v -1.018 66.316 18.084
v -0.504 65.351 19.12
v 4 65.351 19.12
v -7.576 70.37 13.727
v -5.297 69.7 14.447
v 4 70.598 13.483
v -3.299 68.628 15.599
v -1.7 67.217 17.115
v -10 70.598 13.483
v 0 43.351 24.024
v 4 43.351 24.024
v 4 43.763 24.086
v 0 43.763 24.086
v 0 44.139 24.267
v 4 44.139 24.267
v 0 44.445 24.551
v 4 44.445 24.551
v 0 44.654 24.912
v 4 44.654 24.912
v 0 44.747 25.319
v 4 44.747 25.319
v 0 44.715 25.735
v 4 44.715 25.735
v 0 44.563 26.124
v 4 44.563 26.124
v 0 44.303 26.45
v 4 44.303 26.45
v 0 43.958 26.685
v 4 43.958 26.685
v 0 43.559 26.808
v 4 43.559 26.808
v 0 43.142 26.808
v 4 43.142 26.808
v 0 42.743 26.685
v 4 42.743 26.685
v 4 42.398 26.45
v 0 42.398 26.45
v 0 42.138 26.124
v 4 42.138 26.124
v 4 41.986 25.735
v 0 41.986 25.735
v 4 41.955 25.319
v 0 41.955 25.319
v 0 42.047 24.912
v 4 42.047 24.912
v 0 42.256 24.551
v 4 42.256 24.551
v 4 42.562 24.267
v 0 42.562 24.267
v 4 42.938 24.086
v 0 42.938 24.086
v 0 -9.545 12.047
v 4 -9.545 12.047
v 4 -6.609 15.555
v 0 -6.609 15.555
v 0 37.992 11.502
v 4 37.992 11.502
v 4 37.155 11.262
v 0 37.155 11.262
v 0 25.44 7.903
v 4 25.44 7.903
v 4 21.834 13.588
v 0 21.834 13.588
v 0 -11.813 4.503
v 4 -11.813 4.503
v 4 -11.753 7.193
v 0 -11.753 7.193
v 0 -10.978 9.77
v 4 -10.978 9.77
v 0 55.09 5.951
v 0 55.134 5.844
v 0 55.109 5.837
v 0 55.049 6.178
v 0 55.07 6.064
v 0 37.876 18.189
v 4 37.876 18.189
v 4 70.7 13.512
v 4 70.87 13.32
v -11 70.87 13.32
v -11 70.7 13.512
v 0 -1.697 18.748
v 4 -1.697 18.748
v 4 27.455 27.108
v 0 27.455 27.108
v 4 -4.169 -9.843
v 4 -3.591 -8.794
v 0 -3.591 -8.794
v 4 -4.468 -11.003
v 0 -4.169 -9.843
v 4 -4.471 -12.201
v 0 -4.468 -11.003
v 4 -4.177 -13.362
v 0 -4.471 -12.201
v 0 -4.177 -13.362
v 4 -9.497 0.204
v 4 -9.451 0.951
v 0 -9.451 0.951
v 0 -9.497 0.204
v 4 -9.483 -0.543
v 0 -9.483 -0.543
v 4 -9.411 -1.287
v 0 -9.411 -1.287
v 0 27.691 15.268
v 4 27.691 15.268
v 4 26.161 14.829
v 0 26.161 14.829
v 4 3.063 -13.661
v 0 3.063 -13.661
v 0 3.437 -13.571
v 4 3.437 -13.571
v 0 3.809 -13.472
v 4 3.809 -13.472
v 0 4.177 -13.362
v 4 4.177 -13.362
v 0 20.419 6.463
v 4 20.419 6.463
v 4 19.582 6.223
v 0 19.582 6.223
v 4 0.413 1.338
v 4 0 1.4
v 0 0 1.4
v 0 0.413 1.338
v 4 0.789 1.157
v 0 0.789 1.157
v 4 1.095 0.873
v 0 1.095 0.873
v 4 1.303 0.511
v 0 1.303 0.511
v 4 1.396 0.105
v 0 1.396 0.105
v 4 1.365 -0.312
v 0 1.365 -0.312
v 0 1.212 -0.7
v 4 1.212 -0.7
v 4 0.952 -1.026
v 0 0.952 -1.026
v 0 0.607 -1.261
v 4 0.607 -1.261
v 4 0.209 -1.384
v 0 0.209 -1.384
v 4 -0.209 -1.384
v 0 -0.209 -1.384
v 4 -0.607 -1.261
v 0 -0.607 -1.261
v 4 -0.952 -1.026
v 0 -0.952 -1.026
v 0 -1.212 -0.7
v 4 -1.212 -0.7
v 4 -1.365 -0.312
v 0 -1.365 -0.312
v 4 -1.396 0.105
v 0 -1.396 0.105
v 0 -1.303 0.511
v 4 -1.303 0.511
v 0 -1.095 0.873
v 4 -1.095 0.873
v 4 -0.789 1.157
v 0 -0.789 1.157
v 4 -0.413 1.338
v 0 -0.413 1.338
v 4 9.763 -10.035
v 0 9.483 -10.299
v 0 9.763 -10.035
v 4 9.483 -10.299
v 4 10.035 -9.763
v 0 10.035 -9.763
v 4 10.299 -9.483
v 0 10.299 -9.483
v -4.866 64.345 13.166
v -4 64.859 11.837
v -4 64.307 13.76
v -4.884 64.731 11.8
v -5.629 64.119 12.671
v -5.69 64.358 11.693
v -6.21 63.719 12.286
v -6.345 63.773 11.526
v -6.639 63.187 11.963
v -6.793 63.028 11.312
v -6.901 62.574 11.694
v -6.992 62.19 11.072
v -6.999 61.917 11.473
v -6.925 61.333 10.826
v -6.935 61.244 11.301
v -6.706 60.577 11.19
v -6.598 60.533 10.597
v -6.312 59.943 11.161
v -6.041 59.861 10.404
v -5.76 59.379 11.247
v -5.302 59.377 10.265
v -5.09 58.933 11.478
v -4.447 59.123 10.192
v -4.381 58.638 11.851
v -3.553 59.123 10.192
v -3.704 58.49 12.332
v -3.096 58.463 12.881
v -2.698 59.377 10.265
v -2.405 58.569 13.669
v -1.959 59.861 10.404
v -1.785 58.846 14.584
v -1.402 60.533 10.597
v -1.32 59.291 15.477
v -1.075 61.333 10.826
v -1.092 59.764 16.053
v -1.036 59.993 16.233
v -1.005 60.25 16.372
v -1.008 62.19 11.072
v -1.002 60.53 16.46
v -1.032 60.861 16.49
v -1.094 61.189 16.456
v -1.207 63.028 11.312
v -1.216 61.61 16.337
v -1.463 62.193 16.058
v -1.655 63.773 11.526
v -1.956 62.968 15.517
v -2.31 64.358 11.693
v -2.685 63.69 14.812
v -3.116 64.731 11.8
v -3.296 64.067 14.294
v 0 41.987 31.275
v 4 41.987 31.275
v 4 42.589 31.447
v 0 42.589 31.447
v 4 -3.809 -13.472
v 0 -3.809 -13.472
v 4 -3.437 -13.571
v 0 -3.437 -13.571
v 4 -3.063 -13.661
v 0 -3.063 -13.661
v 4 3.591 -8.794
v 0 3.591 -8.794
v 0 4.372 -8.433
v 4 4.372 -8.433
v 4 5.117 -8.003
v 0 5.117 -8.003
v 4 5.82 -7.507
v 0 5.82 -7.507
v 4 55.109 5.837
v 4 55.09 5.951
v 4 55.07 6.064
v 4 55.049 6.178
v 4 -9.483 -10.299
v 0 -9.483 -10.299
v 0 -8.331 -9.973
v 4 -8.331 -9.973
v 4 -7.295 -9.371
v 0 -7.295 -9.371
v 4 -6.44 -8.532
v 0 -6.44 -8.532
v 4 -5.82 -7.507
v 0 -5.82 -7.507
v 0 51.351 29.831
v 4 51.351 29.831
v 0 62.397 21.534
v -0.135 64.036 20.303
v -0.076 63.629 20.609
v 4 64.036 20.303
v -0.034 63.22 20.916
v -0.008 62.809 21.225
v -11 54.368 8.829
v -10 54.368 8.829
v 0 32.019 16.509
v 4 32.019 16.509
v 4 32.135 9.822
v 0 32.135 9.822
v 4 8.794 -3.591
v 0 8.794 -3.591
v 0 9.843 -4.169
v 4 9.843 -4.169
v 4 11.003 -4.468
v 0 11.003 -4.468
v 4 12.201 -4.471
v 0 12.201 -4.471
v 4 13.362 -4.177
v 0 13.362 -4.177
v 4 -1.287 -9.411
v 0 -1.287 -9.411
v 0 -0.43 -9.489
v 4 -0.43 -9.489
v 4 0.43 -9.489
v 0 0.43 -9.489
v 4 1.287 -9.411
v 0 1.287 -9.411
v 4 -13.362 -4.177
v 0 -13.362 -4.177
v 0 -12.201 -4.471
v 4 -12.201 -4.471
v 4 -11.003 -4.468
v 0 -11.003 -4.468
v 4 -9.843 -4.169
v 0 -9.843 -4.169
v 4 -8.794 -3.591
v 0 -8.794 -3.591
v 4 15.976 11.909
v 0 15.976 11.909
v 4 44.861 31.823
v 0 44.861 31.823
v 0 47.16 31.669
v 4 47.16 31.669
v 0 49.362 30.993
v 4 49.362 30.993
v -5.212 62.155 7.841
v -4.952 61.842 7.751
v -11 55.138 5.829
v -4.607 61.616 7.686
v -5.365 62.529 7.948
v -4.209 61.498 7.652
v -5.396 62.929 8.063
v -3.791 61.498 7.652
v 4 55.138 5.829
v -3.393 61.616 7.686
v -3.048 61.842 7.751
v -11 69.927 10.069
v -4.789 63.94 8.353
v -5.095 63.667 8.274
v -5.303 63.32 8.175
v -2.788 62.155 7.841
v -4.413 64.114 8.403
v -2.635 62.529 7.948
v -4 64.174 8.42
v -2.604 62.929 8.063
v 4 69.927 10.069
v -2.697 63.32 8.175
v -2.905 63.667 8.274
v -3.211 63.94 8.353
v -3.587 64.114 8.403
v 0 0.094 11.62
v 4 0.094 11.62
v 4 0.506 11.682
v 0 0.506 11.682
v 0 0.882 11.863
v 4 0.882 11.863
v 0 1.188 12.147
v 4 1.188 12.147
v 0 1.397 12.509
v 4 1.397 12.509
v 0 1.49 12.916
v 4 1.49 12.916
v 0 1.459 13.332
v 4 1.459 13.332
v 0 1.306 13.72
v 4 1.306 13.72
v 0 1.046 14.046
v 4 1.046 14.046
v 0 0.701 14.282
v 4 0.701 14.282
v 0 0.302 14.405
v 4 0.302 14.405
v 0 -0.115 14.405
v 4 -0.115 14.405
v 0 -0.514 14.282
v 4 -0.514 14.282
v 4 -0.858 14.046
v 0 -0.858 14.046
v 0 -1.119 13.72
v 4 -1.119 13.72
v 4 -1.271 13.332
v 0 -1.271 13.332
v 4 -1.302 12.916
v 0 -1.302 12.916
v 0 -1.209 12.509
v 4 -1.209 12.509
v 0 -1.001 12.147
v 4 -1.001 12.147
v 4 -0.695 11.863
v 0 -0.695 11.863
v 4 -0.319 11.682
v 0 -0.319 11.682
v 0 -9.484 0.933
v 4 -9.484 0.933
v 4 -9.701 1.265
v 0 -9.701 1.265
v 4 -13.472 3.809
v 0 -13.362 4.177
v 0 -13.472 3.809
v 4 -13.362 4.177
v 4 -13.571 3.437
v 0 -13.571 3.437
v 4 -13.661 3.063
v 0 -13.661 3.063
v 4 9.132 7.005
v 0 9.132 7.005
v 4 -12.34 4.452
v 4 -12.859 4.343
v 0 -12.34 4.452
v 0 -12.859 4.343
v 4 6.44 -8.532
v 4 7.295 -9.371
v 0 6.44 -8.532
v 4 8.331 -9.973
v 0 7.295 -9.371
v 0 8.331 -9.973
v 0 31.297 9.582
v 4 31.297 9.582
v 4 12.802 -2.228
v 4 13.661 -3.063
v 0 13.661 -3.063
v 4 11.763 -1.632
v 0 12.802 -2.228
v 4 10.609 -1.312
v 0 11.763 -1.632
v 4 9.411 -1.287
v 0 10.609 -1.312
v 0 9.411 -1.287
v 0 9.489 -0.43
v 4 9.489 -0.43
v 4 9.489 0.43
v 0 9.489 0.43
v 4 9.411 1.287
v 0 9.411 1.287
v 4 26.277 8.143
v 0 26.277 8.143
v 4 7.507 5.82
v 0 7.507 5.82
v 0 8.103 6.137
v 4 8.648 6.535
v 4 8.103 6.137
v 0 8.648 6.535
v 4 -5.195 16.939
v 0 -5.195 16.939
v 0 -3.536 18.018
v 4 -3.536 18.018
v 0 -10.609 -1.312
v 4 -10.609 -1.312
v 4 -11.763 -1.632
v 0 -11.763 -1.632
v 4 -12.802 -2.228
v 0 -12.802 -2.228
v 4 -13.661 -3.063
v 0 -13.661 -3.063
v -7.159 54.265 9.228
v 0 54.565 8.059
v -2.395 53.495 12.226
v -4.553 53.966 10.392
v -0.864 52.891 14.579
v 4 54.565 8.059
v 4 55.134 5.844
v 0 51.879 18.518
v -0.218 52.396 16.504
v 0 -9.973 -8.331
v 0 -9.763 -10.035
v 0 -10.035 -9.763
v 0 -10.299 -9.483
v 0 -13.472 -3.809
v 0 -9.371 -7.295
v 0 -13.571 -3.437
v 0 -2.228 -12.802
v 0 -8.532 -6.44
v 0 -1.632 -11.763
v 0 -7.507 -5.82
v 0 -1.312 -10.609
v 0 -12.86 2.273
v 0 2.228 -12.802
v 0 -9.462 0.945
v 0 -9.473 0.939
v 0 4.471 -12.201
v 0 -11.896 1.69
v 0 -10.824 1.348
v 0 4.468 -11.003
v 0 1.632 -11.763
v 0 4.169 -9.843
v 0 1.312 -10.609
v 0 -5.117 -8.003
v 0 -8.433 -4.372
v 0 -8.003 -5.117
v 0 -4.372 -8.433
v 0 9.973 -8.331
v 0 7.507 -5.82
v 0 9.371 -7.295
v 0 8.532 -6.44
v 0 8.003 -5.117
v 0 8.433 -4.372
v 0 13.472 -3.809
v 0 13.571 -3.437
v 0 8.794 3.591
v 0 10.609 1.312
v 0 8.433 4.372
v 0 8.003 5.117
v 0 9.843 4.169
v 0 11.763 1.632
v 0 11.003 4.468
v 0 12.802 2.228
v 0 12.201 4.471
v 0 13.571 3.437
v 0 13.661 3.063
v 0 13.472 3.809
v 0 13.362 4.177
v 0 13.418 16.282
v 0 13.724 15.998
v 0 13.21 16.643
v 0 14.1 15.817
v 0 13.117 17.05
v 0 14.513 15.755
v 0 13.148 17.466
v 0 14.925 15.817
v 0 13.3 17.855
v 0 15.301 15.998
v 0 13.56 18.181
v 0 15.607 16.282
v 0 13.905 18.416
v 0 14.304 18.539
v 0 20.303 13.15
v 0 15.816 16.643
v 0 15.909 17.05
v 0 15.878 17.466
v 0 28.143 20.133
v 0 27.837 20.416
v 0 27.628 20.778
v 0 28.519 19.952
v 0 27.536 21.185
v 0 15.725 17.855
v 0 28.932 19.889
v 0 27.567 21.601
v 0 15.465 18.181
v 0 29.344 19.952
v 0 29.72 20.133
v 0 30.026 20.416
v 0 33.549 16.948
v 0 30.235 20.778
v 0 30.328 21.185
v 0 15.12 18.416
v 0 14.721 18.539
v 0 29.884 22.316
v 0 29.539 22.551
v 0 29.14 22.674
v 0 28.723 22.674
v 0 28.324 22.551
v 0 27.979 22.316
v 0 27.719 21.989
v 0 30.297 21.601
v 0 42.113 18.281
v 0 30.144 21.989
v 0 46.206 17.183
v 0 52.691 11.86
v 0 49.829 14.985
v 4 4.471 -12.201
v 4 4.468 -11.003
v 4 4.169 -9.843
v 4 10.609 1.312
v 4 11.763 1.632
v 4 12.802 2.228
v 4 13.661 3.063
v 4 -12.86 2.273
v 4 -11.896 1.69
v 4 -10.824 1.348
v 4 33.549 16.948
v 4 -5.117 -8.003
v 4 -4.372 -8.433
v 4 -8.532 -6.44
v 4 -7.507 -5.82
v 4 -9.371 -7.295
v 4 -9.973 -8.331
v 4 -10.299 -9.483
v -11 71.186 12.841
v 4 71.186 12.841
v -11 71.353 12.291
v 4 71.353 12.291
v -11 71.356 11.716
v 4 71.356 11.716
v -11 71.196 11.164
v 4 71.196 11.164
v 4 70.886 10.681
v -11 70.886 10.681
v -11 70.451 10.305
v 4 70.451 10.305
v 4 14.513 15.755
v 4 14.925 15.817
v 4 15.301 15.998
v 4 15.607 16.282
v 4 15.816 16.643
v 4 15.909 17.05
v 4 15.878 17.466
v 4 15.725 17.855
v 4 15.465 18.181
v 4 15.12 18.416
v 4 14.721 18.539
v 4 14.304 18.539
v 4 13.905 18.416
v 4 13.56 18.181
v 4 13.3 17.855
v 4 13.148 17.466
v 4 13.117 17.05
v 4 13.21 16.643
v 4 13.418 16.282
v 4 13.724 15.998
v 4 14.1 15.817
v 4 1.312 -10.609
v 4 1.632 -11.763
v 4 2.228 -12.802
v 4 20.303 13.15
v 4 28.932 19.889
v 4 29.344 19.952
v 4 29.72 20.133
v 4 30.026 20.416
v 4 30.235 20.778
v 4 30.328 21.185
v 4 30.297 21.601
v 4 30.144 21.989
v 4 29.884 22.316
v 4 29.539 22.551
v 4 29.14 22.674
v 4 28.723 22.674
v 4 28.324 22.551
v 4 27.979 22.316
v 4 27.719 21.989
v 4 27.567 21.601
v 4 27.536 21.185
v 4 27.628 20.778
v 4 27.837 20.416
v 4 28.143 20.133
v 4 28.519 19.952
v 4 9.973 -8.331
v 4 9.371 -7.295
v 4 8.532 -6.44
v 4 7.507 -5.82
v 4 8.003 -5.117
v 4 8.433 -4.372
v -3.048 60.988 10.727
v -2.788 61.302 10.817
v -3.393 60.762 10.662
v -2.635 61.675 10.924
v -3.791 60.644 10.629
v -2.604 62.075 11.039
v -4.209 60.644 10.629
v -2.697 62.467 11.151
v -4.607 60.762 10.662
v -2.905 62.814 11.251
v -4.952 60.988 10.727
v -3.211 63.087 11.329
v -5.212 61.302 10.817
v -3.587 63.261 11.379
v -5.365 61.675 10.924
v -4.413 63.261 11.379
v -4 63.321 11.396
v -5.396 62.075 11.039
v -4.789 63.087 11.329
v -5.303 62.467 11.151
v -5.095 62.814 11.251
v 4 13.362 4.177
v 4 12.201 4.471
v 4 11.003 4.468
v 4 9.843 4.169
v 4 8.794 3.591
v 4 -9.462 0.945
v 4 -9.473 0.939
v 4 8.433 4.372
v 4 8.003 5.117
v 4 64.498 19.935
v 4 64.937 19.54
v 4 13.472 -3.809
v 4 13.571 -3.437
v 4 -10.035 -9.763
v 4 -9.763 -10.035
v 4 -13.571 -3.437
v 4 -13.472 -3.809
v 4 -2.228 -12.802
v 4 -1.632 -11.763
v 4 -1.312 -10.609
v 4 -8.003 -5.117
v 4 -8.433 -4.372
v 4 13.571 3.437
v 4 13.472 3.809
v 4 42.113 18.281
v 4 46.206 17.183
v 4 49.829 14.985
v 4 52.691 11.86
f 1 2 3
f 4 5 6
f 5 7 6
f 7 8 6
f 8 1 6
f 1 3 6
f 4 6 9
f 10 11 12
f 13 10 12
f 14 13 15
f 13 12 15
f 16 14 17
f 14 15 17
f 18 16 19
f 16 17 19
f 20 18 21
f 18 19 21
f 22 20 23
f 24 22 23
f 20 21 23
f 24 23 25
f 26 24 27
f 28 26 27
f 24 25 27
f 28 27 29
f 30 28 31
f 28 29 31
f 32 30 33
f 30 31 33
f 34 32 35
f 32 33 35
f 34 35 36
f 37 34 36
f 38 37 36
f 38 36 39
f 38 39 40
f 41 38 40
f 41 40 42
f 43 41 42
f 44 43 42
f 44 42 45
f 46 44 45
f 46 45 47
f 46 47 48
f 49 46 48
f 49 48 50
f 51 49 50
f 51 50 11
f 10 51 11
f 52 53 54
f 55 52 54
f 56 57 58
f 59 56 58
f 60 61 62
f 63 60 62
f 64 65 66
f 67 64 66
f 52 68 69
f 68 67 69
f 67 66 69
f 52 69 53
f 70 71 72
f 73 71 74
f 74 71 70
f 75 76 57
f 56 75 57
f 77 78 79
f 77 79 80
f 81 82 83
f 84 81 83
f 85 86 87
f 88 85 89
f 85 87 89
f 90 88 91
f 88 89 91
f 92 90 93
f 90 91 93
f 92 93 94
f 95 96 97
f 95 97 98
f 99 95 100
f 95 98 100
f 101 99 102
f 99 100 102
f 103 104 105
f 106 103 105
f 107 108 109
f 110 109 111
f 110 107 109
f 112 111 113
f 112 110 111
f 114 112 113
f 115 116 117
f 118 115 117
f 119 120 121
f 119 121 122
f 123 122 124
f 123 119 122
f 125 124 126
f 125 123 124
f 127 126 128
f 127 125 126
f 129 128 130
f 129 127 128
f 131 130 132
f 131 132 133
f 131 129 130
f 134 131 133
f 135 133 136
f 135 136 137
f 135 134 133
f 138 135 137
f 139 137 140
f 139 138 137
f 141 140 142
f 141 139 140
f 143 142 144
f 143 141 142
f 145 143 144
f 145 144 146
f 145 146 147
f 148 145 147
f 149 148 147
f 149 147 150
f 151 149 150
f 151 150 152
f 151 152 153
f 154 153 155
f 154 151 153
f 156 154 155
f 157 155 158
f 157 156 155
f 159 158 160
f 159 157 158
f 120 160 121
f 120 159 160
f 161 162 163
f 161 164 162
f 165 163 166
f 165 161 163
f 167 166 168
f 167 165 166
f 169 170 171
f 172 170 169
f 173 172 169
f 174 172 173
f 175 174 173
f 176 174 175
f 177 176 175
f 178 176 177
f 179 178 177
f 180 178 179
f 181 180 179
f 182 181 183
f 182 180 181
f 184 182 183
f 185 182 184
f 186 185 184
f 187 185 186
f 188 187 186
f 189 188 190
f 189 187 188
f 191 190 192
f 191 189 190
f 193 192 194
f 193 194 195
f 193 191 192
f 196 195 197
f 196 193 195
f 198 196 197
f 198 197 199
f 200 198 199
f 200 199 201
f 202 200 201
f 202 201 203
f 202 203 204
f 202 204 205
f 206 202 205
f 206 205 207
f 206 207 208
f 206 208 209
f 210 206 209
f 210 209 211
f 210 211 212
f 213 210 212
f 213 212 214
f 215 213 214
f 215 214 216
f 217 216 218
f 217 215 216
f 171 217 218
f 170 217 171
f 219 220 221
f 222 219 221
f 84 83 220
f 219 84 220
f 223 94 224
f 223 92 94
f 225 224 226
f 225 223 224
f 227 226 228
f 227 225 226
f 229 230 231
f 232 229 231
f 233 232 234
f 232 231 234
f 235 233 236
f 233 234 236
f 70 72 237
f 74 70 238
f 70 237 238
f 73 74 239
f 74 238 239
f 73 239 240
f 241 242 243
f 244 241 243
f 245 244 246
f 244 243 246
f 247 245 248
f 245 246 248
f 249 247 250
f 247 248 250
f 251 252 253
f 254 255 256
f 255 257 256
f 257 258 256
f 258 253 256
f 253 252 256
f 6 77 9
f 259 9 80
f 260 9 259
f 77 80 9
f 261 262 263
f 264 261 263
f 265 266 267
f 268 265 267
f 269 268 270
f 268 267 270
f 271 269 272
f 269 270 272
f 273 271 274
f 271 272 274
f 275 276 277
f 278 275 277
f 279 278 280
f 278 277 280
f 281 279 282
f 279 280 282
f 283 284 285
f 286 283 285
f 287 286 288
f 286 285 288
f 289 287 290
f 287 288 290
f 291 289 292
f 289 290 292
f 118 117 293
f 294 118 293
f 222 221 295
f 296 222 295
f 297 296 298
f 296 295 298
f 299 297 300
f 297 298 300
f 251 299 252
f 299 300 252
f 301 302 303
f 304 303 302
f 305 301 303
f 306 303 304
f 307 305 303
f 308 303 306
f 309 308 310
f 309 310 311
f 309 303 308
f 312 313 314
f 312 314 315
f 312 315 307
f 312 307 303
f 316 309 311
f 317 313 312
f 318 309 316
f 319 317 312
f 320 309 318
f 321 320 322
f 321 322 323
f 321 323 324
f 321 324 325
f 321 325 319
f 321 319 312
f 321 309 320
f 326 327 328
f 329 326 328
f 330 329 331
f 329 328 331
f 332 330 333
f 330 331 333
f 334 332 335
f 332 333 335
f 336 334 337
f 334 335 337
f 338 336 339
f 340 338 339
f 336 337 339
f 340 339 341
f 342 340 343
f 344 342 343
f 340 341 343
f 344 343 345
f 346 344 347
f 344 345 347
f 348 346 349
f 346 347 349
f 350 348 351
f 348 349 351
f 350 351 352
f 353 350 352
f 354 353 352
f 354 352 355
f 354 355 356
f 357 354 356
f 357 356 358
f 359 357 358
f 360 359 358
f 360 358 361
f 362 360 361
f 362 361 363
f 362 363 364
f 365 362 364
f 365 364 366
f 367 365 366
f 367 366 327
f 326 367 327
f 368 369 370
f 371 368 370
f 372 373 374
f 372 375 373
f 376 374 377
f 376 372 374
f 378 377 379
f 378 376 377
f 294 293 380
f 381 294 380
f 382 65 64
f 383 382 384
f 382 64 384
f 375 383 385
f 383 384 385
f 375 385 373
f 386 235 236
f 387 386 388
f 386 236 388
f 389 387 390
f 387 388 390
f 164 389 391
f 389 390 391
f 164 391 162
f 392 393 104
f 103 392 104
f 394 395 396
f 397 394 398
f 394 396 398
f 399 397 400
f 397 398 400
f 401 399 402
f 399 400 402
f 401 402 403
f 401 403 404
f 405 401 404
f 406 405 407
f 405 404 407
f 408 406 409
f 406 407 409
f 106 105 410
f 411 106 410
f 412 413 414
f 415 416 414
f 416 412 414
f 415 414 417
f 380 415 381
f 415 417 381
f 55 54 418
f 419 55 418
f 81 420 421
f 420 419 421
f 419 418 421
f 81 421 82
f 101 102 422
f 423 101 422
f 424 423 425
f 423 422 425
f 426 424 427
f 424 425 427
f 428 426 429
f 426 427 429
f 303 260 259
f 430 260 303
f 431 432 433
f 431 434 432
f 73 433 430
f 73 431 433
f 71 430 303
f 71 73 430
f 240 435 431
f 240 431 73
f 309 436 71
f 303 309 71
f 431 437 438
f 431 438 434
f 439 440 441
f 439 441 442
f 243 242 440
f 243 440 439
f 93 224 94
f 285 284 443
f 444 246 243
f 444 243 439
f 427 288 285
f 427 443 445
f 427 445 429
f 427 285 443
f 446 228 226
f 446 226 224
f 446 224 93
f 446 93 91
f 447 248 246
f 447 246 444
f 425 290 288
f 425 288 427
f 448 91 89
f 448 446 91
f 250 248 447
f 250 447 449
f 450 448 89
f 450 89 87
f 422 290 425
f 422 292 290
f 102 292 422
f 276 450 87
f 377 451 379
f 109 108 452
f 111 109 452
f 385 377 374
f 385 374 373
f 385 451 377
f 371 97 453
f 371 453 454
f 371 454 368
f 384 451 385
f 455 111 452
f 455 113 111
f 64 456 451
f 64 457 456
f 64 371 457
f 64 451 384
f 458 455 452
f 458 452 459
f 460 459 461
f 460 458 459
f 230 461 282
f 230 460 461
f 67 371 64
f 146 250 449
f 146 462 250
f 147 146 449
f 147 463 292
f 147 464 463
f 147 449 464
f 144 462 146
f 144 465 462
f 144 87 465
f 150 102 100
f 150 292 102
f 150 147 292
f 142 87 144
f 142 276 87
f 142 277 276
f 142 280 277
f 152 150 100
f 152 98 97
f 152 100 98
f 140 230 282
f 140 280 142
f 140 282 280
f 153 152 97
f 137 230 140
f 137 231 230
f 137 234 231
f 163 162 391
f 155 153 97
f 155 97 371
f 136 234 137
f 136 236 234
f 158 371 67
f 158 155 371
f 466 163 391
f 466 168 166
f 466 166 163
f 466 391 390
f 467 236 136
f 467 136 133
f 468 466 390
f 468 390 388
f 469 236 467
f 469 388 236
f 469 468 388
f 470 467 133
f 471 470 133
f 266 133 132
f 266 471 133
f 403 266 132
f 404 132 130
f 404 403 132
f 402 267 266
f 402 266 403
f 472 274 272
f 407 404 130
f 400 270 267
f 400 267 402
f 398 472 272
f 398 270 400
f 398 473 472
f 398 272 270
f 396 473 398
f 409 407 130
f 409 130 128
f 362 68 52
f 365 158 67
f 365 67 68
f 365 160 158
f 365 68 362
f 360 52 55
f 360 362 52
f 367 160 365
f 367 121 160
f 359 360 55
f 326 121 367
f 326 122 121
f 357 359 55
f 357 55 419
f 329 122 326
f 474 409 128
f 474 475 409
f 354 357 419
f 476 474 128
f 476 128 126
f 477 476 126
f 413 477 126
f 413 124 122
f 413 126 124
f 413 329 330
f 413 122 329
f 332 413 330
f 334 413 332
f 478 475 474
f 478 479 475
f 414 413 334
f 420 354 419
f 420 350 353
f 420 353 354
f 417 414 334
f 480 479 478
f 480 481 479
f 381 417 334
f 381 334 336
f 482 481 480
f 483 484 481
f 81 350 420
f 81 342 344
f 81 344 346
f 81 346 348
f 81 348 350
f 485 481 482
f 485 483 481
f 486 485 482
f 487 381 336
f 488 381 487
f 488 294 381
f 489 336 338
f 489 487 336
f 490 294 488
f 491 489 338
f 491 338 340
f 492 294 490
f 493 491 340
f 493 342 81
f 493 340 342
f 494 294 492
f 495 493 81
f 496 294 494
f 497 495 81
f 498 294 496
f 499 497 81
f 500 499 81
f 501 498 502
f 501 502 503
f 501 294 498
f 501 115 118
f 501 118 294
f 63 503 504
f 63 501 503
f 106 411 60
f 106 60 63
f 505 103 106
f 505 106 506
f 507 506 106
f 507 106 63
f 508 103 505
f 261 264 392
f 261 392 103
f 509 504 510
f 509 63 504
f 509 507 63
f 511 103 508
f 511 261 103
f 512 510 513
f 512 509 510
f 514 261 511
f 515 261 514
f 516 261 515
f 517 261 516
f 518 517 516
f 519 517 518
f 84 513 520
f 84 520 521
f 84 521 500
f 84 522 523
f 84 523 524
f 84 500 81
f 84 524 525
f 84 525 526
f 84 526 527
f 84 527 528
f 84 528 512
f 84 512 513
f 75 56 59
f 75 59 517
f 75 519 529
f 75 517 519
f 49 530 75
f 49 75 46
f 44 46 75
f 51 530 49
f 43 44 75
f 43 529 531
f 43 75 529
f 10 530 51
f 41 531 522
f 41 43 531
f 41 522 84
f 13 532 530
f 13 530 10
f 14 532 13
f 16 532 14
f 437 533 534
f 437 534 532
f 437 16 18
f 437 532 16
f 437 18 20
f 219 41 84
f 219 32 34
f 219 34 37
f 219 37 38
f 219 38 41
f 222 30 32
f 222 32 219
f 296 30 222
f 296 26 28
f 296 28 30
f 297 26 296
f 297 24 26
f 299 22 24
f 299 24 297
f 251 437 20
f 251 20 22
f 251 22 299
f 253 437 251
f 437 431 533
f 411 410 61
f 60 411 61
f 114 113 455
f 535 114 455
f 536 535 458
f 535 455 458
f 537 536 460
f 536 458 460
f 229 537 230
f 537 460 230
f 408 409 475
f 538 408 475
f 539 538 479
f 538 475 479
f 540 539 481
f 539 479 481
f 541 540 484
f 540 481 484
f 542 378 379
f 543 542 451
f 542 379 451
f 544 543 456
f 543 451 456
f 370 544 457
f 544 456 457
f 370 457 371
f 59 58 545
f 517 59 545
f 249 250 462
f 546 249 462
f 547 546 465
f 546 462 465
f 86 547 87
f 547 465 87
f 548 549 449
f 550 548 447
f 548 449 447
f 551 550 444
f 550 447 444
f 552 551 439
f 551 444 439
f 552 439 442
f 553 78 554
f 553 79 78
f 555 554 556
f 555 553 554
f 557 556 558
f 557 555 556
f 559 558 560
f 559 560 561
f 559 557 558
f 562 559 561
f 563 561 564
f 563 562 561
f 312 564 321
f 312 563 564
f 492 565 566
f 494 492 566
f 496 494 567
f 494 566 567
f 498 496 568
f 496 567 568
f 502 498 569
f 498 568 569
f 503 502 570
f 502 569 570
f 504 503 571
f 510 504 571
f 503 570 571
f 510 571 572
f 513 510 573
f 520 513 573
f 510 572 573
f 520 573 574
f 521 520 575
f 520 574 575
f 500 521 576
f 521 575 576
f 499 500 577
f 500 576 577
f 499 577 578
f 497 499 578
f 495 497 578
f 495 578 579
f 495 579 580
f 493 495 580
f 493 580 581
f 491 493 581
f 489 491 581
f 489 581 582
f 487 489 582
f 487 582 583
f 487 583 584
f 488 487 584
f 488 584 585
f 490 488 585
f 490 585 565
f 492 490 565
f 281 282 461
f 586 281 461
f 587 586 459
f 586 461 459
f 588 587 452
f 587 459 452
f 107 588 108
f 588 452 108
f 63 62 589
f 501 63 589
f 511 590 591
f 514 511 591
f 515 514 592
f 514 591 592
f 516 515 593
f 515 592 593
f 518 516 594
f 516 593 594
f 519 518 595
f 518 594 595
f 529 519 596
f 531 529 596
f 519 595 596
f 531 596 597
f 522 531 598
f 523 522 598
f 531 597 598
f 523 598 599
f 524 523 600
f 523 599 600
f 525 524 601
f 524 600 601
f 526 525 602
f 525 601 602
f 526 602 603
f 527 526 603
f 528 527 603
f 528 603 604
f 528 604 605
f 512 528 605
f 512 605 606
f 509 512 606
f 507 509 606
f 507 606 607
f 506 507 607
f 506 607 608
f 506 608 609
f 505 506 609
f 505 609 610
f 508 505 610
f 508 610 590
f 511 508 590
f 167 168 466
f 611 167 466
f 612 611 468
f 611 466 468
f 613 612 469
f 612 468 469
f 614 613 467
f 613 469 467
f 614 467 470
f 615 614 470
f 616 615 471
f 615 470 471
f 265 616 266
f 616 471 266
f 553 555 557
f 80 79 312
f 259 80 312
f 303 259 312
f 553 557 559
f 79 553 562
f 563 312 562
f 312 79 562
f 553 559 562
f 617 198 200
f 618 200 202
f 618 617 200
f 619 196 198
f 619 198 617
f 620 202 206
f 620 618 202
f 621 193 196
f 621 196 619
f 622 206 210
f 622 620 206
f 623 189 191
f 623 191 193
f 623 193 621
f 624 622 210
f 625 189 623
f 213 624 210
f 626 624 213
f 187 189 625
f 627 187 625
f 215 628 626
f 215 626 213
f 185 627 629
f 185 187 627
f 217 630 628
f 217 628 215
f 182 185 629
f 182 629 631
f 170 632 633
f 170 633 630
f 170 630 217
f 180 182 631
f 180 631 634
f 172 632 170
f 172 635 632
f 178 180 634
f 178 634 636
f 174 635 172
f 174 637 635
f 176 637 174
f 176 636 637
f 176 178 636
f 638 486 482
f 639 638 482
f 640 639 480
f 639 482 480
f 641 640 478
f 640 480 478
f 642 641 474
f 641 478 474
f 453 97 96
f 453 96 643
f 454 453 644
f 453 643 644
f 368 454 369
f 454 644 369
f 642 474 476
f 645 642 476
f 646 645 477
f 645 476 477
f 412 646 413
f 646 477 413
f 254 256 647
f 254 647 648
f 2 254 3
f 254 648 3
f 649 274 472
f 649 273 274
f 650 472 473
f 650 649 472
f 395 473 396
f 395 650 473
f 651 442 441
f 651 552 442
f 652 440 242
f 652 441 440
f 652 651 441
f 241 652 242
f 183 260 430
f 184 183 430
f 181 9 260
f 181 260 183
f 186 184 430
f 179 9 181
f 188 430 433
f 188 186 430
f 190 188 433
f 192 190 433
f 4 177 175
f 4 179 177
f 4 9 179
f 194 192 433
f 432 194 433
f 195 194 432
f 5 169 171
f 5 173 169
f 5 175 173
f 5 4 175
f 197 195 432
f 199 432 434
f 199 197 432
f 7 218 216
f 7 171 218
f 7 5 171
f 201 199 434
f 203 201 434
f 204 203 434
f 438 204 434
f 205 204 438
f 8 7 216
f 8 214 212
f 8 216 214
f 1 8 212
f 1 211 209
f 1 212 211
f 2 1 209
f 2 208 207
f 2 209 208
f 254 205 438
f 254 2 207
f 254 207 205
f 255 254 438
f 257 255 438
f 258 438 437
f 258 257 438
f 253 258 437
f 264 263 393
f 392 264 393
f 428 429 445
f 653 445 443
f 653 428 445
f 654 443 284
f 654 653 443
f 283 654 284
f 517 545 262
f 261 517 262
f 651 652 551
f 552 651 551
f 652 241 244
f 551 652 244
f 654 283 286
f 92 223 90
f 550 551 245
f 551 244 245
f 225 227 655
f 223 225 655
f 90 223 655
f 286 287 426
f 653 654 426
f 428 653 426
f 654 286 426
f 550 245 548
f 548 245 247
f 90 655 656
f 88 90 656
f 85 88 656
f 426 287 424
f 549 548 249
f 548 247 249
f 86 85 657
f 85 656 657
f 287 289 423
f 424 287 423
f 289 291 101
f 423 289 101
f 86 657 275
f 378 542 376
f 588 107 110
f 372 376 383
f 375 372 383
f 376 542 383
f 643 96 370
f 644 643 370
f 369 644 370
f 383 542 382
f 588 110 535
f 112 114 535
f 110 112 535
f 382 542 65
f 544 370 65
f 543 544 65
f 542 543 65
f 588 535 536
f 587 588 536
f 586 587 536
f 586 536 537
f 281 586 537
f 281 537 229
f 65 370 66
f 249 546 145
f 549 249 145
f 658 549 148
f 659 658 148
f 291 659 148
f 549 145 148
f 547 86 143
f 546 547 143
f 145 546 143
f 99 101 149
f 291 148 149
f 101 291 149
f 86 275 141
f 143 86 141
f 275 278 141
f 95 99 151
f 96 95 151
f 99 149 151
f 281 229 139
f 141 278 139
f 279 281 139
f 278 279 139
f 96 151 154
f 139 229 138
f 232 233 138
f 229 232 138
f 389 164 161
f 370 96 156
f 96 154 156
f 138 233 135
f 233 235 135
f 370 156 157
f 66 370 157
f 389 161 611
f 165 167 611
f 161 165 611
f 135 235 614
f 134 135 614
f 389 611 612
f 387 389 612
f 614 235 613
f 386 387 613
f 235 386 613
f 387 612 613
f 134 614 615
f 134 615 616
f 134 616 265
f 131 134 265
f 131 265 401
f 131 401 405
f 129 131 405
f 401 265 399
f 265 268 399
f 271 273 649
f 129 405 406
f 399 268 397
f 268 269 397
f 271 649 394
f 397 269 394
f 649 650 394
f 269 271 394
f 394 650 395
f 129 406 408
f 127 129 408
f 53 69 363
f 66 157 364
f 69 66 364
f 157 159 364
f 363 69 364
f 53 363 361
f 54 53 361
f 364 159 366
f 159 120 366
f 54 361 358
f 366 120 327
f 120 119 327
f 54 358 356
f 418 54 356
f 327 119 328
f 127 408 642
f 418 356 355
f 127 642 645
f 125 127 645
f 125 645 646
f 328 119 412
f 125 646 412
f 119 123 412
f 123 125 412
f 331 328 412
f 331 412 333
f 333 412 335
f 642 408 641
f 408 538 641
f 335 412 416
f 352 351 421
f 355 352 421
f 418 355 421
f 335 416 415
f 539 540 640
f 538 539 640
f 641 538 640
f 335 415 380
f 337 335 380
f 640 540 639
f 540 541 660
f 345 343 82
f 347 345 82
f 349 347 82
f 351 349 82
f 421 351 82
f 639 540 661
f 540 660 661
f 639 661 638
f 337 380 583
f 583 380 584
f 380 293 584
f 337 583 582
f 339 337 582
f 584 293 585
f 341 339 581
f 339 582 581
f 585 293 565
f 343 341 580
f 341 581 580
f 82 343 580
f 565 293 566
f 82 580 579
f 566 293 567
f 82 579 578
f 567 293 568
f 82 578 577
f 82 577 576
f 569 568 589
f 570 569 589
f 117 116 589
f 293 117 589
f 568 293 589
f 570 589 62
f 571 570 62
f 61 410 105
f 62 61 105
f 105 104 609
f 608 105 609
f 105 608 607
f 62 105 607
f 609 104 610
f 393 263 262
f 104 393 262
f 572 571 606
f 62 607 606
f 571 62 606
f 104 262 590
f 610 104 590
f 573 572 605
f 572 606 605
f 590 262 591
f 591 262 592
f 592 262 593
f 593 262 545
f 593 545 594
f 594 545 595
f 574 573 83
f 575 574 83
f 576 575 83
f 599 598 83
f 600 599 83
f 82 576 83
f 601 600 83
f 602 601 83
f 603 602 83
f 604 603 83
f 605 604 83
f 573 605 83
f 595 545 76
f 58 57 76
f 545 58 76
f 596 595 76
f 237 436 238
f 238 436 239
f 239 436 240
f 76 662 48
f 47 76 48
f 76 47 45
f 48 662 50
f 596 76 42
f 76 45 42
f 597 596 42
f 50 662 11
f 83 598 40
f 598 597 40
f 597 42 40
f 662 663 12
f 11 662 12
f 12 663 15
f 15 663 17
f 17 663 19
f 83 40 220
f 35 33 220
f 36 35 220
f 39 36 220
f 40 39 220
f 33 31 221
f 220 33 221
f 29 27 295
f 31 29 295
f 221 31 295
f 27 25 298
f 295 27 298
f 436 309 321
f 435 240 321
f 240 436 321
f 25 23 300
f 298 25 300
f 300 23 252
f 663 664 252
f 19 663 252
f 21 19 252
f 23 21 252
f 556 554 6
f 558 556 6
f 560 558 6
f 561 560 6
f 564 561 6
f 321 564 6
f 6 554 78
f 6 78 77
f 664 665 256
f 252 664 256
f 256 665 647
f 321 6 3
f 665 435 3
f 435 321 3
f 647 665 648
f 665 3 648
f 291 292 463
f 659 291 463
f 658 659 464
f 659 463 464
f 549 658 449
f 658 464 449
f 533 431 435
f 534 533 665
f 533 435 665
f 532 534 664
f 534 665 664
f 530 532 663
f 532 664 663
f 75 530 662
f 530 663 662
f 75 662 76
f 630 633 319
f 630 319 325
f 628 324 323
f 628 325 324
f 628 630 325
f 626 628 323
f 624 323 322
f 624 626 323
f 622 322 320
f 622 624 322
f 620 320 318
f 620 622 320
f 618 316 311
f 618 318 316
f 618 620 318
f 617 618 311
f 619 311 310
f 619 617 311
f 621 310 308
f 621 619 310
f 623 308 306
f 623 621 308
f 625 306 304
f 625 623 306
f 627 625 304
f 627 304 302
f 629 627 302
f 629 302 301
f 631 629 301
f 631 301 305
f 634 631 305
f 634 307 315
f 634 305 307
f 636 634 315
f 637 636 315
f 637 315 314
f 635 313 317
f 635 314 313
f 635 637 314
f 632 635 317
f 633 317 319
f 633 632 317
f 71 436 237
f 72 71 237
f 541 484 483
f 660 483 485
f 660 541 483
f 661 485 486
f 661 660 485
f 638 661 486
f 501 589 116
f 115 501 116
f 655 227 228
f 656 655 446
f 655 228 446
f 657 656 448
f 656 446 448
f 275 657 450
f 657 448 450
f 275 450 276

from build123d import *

# Parameters (mm, degrees)
BASPROSKE_W              = 4
BASPROSKE_H              = 14
TOOTHCUT_DEPTH           = 21.199009877
TEETHCUTS_COUNT          = 12
TEETHCUTS_ANGLE          = 330
BORSKE_R                 = 4
BORE_DEPTH               = 50.0000508
EXTRUDE_1_DEPTH          = 4
FILLET_1_R               = 10
EXTRUDE_2_DEPTH          = 15
FILLET_2_R               = 2
FILLET_3_R               = 10
EXTRUDE_START            = -4
SKETCH_6_R               = 4
SKETCH_6_R_2             = 1.4
EXTRUDE_3_DEPTH          = 4
CUT_EXTRUDE_6_DEPTH      = 15
CUT_EXTRUDE_6_DEPTH_BACK = 34
SKETCH_7_R               = 1.4
SKETCH_8_R               = 3
CUT_EXTRUDE_7_DEPTH      = 6
SKETCH_10_R              = 1.4
CUT_EXTRUDE_8_DEPTH      = 15


with BuildPart() as part:
    # BasProSke → Base-Revolve (revolve)
    with BuildSketch(Plane(origin=(0, 0, 0), x_dir=(1, 0, 0), z_dir=(0, 1, 0)), mode=Mode.PRIVATE) as base_revolve_sk:
        with Locations((2, 7)):
            Rectangle(BASPROSKE_W, BASPROSKE_H)
    revolve(base_revolve_sk.sketch.rotate(Axis((-10, 0, 0), (1, 0, 0)), 180), axis=Axis((-10, 0, 0), (1, 0, 0)))

    # TooCutSke → ToothCut (cut, through all)
    with BuildSketch(Plane(origin=(0, 0, 0), x_dir=(0, 0, -1), z_dir=(1, 0, 0))):
        with BuildLine():
            ThreePointArc((1.286803432, 9.41143655), (0, 9.499), (-1.286803432, 9.41143655))
            ThreePointArc((-1.286803432, 9.41143655), (-1.63841703, 11.778122922), (-3.088844097, 13.681041163))
            ThreePointArc((-3.088844097, 13.681041163), (0, 14.0254), (3.088844097, 13.681041163))
            ThreePointArc((3.088844097, 13.681041163), (1.63841703, 11.778122922), (1.286803432, 9.41143655))
        make_face()
    toothcut = extrude(amount=TOOTHCUT_DEPTH, mode=Mode.SUBTRACT)

    # TeethCuts: ToothCut ×12 about axis
    teethcuts_axis = Axis((-10, 0, 0), (1, 0, 0))
    for i in range(1, TEETHCUTS_COUNT):
        add(toothcut.rotate(teethcuts_axis, i * TEETHCUTS_ANGLE / (TEETHCUTS_COUNT - 1)), mode=Mode.SUBTRACT)

    # BorSke → Bore (cut, symmetric)
    with BuildSketch(Plane(origin=(0, 0, 0), x_dir=(0, 0, -1), z_dir=(1, 0, 0))):
        with Locations(Location((0, 0, 0), (0, 0, 180))):
            Circle(BORSKE_R)
    extrude(amount=BORE_DEPTH, both=True, mode=Mode.SUBTRACT)

    # 草图3 → 凸台-拉伸1 (add)
    with BuildSketch(Plane(origin=(4, 0, 0), x_dir=(0, 0, -1), z_dir=(1, 0, 0))):
        with BuildLine():
            Line((-0.932792576, -9.484020621), (-7.220100828, -13.585142245))
            Line((-7.220100828, -13.585142245), (-17.903981346, -4.642128436))
            Line((-17.903981346, -4.642128436), (-27.107817182, 27.455461598))
            Line((-27.107817182, 27.455461598), (-31.27472335, 41.987190356))
            Line((-31.27472335, 41.987190356), (-32.818773393, 47.371932777))
            Line((-32.818773393, 47.371932777), (-19.769712012, 64.746456846))
            Line((-19.769712012, 64.746456846), (-10.953080107, 72.951947941))
            Line((-10.953080107, 72.951947941), (-6.126084714, 56.118214487))
            Line((-6.126084714, 56.118214487), (-5.836675561, 55.108924829))
            ThreePointArc((-5.836675561, 55.108924829), (-15.58167252, 49.050779668), (-18.188670428, 37.876270712))
            Line((-18.188670428, 37.876270712), (-11.502054977, 37.992325671))
            Line((-11.502054977, 37.992325671), (-11.26200008, 37.155154756))
            Line((-11.26200008, 37.155154756), (-16.947814294, 33.548891109))
            Line((-16.947814294, 33.548891109), (-16.509005291, 32.018582252))
            Line((-16.509005291, 32.018582252), (-9.82238984, 32.134637212))
            Line((-9.82238984, 32.134637212), (-9.582334943, 31.297466297))
            Line((-9.582334943, 31.297466297), (-15.268149157, 27.691202649))
            Line((-15.268149157, 27.691202649), (-14.829340154, 26.160893793))
            Line((-14.829340154, 26.160893793), (-8.142724703, 26.276948752))
            Line((-8.142724703, 26.276948752), (-7.902669806, 25.439777837))
            Line((-7.902669806, 25.439777837), (-13.58848402, 21.83351419))
            Line((-13.58848402, 21.83351419), (-13.149675017, 20.303205333))
            Line((-13.149675017, 20.303205333), (-6.463059566, 20.419260292))
            Line((-6.463059566, 20.419260292), (-6.223004669, 19.582089377))
            Line((-6.223004669, 19.582089377), (-11.908818883, 15.97582573))
            Line((-11.908818883, 15.97582573), (-5.780671989, 7.422544069))
            ThreePointArc((-5.780671989, 7.422544069), (-4.284008868, -1.296630558), (-0.932792576, -9.484020621))
        make_face()
    extrude(amount=-EXTRUDE_1_DEPTH)

    # 圆角1
    # the kernel refuses this fillet: 10 mm, written as the material it takes off along each edge
    with BuildSketch(Plane(origin=(16.439550253, 47.371932777, 32.818773393), x_dir=(0, 0.7995984784044031, -0.6005349892665399), z_dir=(-1, 0, 0))) as fillet_1_piece_1:
        with BuildLine():
            CenterArc((FILLET_1_R * 0.497582010116, FILLET_1_R), FILLET_1_R, 217.091776954, 52.908223046)
            Line((-FILLET_1_R * 0.300088482439, FILLET_1_R * 0.396906487096), (-FILLET_1_R * 0.31604189229, FILLET_1_R * 0.384844616838))
            Line((-FILLET_1_R * 0.31604189229, FILLET_1_R * 0.384844616838), (-FILLET_1_R * 0.00995164020233, -FILLET_1_R * 0.02))
            Line((-FILLET_1_R * 0.00995164020233, -FILLET_1_R * 0.02), (FILLET_1_R * 0.497582010116, -FILLET_1_R * 0.02))
            Line((FILLET_1_R * 0.497582010116, -FILLET_1_R * 0.02), (FILLET_1_R * 0.497582010116, 0))
        make_face()
    extrude(amount=28.879100506, mode=Mode.SUBTRACT)
    with BuildSketch(Plane(origin=(6.219749224, 64.746456846, 19.769712012), x_dir=(0, 0.6812807658980115, -0.7320222114235461), z_dir=(-1, 0, 0))) as fillet_1_piece_2:
        with BuildLine():
            CenterArc((FILLET_1_R * 0.0887899689748, FILLET_1_R), FILLET_1_R, 259.852030904, 10.147969096)
            Line((-FILLET_1_R * 0.0874009400017, FILLET_1_R * 0.0156439853417), (-FILLET_1_R * 0.0909247581812, -FILLET_1_R * 0.00404313495151))
            Line((-FILLET_1_R * 0.0909247581812, -FILLET_1_R * 0.00404313495151), (-FILLET_1_R * 0.0017757993795, -FILLET_1_R * 0.02))
            Line((-FILLET_1_R * 0.0017757993795, -FILLET_1_R * 0.02), (FILLET_1_R * 0.0887899689748, -FILLET_1_R * 0.02))
            Line((FILLET_1_R * 0.0887899689748, -FILLET_1_R * 0.02), (FILLET_1_R * 0.0887899689748, 0))
        make_face()
    extrude(amount=8.439498449, mode=Mode.SUBTRACT)
    with BuildSketch(Plane(origin=(11.659672741, -4.642128436, 17.903981346), x_dir=(0, 0.9612616959383188, 0.2756373558169997), z_dir=(-1, 0, 0))) as fillet_1_piece_3:
        with BuildLine():
            CenterArc((FILLET_1_R * 0.306386909629, FILLET_1_R), FILLET_1_R, 235.931242449, 34.068757551)
            Line((-FILLET_1_R * 0.253800473888, FILLET_1_R * 0.171634081249), (-FILLET_1_R * 0.265004221559, FILLET_1_R * 0.155066762874))
            Line((-FILLET_1_R * 0.265004221559, FILLET_1_R * 0.155066762874), (-FILLET_1_R * 0.00612773819259, -FILLET_1_R * 0.02))
            Line((-FILLET_1_R * 0.00612773819259, -FILLET_1_R * 0.02), (FILLET_1_R * 0.306386909629, -FILLET_1_R * 0.02))
            Line((FILLET_1_R * 0.306386909629, -FILLET_1_R * 0.02), (FILLET_1_R * 0.306386909629, 0))
        make_face()
    extrude(amount=19.319345481, mode=Mode.SUBTRACT)
    with BuildSketch(Plane(origin=(19.737715423, -13.585142245, 7.220100828), x_dir=(0, 0.6418678587609061, 0.7668152658167999), z_dir=(-1, 0, 0))) as fillet_1_piece_4_section:
        with BuildLine():
            CenterArc((6.295086169, 10), FILLET_1_R, 223.606014756, 46.393985244)
            Line((-0.945908461, 3.103044385), (-1.090728354, 2.965105272))
            ThreePointArc((-1.090728354, 2.965105272), (-0.664263166, 1.493205031), (-0.191308935, -0.058317161))
            Line((-0.191308935, -0.058317161), (0, -0.2))
            Line((0, -0.2), (6.295086169, -0.2))
            Line((6.295086169, -0.2), (6.295086169, 0))
        make_face()
    fillet_1_piece_4 = extrude(amount=35.475430846, mode=Mode.PRIVATE)
    fillet_1_piece_4 = fillet_1_piece_4 - Plane(origin=(2, -11.614079795, -0.29286421), x_dir=(0, 0.587528112701377, 0.8092037548019401), z_dir=(-1, 0, 0)) * Cylinder(4.8, 97, mode=Mode.PRIVATE)
    add(fillet_1_piece_4, mode=Mode.SUBTRACT)

    # 草图4 → 凸台-拉伸2 (add)
    with BuildSketch(Plane(origin=(4, 0, 0), x_dir=(0, 0, -1), z_dir=(1, 0, 0))):
        Polygon((-13.512013594, 70.700072728), (-8.828756529, 54.367614394), (-5.828756529, 55.138253385), (-10.945161074, 72.981276497), align=None)
    extrude(amount=-EXTRUDE_2_DEPTH)

    # 圆角2
    fillet_2_edges = [part.edges().sort_by_distance(p)[0] for p in [
        (-3.5, 72.981276497, 10.945161074),
    ]]
    fillet(fillet_2_edges, radius=FILLET_2_R)

    # 圆角3
    fillet_3_edges = [part.edges().sort_by_distance(p)[0] for p in [
        (0, 62.482661808, 11.15570893),
    ]]
    fillet(fillet_3_edges, radius=FILLET_3_R)

    # 草图6 → 凸台-拉伸3 (add)
    with BuildSketch(Plane.ZY.offset(EXTRUDE_START)):
        Circle(SKETCH_6_R)
        Circle(SKETCH_6_R_2, mode=Mode.SUBTRACT)
    extrude(amount=EXTRUDE_3_DEPTH)

    # 草图7 → 切除-拉伸6 (cut, two sides: drawn at the far end of the back side and taken through both)
    with BuildSketch(Plane(origin=(0, 2.640469614, -9.20841187), x_dir=(-1, 0, 0), z_dir=(0, 0.275637355817, -0.9612616959383188)).offset(-CUT_EXTRUDE_6_DEPTH_BACK)):
        with Locations(Location((4, 62.608913997, 0), (0, 0, 90))):
            Circle(SKETCH_7_R)
    extrude(amount=CUT_EXTRUDE_6_DEPTH + CUT_EXTRUDE_6_DEPTH_BACK, mode=Mode.SUBTRACT)

    # 草图8 → 切除-拉伸7 (cut)
    with BuildSketch(Plane(origin=(0, 1.791367175, -6.247239762), x_dir=(1, 0, 0), z_dir=(0, -0.275637355817, 0.9612616959383187))):
        with Locations(Location((-4, 62.608913997, 0), (0, 0, 90))):
            Circle(SKETCH_8_R)
    extrude(amount=CUT_EXTRUDE_7_DEPTH, mode=Mode.SUBTRACT)

    # 草图10 → 切除-拉伸8 (cut)
    with BuildSketch(Plane(origin=(4, 0, 0), x_dir=(0, 0, -1), z_dir=(1, 0, 0))):
        with Locations((-25.423875567, 43.350590959)):
            Circle(SKETCH_10_R)
        with Locations((-21.28931523, 28.93166552)):
            Circle(SKETCH_10_R)
        with Locations((-17.154754893, 14.512740081)):
            Circle(SKETCH_10_R)
        with Locations((-13.020194555, 0.093814642)):
            Circle(SKETCH_10_R)
    extrude(amount=-CUT_EXTRUDE_8_DEPTH, mode=Mode.SUBTRACT)


solid = part.part
